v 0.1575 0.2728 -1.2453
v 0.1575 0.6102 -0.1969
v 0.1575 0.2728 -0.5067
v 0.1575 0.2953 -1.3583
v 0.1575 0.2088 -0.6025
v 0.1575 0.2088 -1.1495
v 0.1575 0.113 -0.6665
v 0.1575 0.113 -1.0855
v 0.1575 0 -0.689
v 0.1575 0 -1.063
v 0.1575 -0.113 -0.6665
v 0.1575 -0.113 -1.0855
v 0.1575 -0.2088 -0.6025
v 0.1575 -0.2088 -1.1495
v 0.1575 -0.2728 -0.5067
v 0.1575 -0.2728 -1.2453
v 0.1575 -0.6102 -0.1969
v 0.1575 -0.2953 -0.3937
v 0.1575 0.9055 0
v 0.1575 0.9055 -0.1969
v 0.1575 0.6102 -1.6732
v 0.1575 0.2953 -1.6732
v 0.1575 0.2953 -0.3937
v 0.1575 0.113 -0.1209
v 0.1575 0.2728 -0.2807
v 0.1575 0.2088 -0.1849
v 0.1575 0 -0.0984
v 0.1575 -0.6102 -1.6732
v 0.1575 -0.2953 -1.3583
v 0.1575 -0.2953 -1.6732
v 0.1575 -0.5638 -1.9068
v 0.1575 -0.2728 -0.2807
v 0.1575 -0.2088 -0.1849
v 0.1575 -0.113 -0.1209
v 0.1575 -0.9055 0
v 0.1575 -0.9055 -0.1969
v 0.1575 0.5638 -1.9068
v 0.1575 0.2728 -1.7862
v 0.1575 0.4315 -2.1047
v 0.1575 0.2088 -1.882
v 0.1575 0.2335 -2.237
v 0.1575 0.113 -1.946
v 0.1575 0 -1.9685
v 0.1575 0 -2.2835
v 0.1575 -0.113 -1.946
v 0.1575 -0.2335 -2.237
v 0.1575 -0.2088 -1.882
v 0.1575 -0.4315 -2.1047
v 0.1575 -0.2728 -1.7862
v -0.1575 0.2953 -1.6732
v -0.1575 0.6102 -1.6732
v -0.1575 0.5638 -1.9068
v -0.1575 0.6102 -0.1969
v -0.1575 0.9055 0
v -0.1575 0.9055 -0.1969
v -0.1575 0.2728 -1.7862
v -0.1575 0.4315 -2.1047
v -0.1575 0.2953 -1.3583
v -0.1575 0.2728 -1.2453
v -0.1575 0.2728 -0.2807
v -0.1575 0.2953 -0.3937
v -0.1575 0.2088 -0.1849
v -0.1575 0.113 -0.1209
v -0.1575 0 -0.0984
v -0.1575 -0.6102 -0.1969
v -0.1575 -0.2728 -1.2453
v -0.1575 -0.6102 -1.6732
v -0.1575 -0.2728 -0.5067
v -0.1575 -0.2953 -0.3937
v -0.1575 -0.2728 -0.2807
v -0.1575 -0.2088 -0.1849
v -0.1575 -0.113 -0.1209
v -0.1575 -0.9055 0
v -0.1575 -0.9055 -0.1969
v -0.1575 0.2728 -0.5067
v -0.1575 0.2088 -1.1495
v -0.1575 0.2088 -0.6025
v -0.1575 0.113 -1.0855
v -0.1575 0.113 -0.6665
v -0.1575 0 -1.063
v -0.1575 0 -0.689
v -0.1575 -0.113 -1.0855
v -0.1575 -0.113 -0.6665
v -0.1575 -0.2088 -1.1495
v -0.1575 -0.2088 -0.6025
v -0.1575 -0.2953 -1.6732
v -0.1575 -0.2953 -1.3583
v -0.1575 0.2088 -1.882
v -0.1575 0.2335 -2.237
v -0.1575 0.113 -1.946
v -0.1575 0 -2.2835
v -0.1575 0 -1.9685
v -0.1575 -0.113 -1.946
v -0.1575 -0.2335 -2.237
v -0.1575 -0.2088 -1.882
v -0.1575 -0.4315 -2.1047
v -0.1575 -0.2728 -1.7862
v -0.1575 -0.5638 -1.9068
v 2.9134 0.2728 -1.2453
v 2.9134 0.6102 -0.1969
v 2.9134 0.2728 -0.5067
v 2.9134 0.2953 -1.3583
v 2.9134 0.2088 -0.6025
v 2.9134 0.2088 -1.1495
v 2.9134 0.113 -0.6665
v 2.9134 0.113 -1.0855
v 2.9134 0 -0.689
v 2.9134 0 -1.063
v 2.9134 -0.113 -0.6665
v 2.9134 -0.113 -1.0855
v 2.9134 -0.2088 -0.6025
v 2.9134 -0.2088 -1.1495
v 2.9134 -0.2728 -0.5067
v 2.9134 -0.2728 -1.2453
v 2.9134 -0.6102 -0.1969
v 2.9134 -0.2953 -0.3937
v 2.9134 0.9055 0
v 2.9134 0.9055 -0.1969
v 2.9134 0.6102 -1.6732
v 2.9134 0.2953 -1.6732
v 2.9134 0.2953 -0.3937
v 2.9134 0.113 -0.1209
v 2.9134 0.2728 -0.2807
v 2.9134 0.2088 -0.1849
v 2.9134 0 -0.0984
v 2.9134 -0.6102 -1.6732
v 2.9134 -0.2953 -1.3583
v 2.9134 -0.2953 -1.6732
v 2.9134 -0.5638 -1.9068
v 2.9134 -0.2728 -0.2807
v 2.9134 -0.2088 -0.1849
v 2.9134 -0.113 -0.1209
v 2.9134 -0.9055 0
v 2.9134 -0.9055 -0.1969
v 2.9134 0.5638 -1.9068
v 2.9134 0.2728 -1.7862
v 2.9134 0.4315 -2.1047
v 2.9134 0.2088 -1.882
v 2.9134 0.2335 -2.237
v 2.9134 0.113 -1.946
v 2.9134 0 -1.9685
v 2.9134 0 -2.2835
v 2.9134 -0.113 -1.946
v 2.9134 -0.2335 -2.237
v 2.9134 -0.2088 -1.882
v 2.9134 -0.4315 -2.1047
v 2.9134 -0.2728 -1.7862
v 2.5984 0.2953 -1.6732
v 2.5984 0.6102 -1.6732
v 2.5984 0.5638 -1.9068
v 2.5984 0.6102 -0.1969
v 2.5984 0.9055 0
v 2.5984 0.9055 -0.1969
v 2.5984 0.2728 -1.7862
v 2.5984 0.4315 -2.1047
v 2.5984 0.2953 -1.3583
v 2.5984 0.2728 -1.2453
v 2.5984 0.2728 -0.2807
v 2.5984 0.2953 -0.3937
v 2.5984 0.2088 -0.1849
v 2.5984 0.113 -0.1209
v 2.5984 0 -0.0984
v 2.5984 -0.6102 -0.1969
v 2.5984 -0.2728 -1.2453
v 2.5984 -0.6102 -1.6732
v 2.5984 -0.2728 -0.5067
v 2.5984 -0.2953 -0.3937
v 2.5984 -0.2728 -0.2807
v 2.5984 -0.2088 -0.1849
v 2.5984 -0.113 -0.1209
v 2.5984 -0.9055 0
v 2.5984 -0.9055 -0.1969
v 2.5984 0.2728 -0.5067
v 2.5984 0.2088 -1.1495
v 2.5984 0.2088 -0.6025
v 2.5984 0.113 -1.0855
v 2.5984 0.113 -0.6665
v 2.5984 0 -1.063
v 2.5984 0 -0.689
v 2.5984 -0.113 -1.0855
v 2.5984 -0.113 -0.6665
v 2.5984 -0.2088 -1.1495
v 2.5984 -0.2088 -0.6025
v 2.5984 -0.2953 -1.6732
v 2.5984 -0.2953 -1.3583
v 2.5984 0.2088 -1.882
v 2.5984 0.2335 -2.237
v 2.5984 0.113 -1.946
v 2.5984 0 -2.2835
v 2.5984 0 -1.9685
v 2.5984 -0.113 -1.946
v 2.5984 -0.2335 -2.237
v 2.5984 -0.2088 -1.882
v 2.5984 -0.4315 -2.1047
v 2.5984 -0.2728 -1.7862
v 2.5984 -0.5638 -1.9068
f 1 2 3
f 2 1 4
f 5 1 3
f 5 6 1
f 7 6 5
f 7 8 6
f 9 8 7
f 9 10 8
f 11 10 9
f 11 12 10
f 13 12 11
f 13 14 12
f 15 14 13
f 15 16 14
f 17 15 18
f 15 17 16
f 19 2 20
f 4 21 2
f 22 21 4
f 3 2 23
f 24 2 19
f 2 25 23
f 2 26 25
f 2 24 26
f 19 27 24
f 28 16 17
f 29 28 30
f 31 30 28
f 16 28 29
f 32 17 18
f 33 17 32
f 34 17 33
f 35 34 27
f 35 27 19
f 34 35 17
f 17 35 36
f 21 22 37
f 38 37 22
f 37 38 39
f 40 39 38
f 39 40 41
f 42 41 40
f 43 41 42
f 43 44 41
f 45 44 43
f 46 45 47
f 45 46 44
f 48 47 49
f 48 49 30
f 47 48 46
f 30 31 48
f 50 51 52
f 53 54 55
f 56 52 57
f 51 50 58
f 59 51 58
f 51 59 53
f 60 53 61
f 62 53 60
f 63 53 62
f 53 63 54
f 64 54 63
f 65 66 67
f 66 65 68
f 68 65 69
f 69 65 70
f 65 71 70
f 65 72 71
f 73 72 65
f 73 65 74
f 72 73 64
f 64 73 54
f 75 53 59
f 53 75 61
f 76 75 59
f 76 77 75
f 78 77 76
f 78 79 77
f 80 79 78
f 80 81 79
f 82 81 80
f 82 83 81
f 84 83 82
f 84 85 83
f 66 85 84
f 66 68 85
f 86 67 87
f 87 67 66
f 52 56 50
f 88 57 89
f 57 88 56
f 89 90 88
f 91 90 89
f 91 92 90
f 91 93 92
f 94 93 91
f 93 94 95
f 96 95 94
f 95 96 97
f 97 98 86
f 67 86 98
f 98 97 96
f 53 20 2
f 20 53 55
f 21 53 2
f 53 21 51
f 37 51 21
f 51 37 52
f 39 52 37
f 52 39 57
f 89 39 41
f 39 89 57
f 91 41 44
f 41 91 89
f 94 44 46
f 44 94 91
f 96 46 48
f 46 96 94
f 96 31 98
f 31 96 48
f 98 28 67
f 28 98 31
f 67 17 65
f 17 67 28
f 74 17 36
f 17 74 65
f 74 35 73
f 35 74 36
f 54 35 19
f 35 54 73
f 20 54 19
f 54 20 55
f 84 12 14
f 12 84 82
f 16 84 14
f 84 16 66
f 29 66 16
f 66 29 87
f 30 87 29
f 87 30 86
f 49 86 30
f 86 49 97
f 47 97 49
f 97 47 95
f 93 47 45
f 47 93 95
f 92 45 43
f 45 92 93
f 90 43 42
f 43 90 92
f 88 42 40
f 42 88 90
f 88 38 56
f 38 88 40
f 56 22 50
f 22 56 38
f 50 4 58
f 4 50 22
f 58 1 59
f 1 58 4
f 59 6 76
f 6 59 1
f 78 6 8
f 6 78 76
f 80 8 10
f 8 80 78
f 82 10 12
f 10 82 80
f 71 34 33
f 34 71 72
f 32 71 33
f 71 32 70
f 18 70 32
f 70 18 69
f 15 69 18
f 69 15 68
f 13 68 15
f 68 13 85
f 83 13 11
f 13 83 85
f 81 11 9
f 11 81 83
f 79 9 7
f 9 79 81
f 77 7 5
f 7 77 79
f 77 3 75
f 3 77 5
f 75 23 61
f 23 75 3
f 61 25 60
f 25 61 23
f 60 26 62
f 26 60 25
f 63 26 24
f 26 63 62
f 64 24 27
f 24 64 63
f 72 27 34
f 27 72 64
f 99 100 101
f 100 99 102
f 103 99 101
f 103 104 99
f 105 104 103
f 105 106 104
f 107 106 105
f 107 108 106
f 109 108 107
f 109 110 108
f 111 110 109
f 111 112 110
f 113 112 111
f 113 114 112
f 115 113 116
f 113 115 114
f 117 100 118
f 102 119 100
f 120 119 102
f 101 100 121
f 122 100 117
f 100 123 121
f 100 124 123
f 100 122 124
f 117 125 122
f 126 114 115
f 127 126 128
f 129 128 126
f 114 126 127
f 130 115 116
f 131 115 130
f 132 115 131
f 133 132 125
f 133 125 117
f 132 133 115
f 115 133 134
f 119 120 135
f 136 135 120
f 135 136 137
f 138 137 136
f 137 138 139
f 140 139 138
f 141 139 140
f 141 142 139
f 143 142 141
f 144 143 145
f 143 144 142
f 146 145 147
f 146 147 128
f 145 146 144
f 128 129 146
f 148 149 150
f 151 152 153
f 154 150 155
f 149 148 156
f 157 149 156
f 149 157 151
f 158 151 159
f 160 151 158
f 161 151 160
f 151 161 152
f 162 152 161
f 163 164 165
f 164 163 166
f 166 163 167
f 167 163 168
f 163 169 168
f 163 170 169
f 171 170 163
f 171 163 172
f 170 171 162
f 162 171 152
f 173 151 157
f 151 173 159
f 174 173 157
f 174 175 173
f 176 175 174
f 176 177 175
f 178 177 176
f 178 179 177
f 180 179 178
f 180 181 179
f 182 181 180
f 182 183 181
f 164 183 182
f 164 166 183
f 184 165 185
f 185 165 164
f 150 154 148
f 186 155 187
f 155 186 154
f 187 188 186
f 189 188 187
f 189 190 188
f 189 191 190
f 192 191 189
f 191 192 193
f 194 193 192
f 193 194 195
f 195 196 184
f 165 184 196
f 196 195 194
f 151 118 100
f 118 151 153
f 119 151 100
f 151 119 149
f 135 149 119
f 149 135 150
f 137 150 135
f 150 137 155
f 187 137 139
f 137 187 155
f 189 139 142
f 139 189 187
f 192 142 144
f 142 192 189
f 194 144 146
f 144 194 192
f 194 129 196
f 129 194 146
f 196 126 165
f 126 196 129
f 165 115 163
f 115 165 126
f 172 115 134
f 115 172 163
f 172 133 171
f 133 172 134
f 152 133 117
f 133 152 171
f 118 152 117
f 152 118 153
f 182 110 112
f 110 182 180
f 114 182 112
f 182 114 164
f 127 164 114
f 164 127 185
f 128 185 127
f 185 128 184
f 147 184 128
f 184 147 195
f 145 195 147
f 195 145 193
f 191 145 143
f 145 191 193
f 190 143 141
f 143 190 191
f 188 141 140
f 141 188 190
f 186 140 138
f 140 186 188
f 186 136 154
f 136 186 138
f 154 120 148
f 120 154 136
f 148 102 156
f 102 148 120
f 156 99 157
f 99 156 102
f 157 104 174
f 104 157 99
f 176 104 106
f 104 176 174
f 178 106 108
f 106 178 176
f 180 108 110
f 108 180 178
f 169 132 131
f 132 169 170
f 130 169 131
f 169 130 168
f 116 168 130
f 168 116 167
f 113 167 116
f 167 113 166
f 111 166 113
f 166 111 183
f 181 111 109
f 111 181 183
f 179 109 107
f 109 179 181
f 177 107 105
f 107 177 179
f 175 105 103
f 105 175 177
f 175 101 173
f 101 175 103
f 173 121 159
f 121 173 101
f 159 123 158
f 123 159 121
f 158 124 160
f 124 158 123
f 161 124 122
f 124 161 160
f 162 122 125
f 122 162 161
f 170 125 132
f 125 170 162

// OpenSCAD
// file: RA12131100.scad
w_body = 18.9;
h_body = 12.0;
d_body = 11.6;

w_top = 21.0;
h_top = 15.0;
d_top = 2.0;

w_switch = w_body * 0.8;
h_switch = 9.7;
d_switch = 6.0;

w_lug = 0.8;
h_lug = 3.1;
d_lug = 5.8;

lug_distance = 7.0;
lug_base_widen = 1.5;

lug_base_hole_pos = 1.0;
lug_hole_d = 1.5;
lug_hole_tall_d = 2.3;

module body() {
  translate([-w_body/2, -h_body/2])
  cube([w_body, h_body, d_body]);

  translate([-w_top/2, -h_top/2, d_body])
  cube([w_top, h_top, d_top]);
}

module switch() {
  translate([-w_switch/2, 0, d_top + d_body])
  rotate([90, 0, 0])
  linear_extrude(h_switch, center=true)
  polygon([
    [0, 0],
    [w_switch, 0],
    [w_switch*0.2, d_switch]
  ]);
}

module lug() {
  module lug_body() {
    union() {
      translate([-h_lug/2, 0])
      square([h_lug, d_lug-h_lug/2]);

      translate([-(h_lug + lug_base_widen)/2, 0])
      square([(h_lug + lug_base_widen), 0.5]);

      translate([0, d_lug-h_lug/2])
      resize([h_lug, h_lug])
      circle(5);
    }  
  }
  
  module lug_hole() {
    resize([lug_hole_d, lug_hole_d])
    circle(5);
  }
  module lug_hole_tall() {
    rotate([0, 0, 180])
    union() {      
      lug_hole();    
      translate([0, lug_hole_tall_d-lug_hole_d])    
      lug_hole();
      translate([-lug_hole_d/2, 0])
      square([lug_hole_d, lug_hole_tall_d-lug_hole_d]);
    }
  }
  
  rotate([-90, 0, 90])
  linear_extrude(w_lug, center=true)
  difference() {
    lug_body();
    translate([0, lug_base_hole_pos])
    lug_hole();
    translate([0, d_lug-h_lug/2])
    lug_hole_tall();
  }
}

module lugs() {
  lug();

  translate([lug_distance, 0])
  lug();
}

module ra12131100() {
  color([0.2, 0.2, 0.2])
  body();

  color([0.2, 0.2, 0.2])
  switch();

  color([0.8, 0.8, 0.8])
  lugs();
}
// file: ../openscad/utils.scad
module copy_mirror(vec=[0, 1, 0]) {
  children();

  mirror(vec)
  children();
}

module scale_to_kicad_inches() {
  scale([1/2.54, 1/2.54, 1/2.54])
  children();
}
// main file
use <../openscad/utils.scad>;
use <RA12131100.scad>

scale_to_kicad_inches()
color([0.8, 0.8, 0.8])
lugs();
